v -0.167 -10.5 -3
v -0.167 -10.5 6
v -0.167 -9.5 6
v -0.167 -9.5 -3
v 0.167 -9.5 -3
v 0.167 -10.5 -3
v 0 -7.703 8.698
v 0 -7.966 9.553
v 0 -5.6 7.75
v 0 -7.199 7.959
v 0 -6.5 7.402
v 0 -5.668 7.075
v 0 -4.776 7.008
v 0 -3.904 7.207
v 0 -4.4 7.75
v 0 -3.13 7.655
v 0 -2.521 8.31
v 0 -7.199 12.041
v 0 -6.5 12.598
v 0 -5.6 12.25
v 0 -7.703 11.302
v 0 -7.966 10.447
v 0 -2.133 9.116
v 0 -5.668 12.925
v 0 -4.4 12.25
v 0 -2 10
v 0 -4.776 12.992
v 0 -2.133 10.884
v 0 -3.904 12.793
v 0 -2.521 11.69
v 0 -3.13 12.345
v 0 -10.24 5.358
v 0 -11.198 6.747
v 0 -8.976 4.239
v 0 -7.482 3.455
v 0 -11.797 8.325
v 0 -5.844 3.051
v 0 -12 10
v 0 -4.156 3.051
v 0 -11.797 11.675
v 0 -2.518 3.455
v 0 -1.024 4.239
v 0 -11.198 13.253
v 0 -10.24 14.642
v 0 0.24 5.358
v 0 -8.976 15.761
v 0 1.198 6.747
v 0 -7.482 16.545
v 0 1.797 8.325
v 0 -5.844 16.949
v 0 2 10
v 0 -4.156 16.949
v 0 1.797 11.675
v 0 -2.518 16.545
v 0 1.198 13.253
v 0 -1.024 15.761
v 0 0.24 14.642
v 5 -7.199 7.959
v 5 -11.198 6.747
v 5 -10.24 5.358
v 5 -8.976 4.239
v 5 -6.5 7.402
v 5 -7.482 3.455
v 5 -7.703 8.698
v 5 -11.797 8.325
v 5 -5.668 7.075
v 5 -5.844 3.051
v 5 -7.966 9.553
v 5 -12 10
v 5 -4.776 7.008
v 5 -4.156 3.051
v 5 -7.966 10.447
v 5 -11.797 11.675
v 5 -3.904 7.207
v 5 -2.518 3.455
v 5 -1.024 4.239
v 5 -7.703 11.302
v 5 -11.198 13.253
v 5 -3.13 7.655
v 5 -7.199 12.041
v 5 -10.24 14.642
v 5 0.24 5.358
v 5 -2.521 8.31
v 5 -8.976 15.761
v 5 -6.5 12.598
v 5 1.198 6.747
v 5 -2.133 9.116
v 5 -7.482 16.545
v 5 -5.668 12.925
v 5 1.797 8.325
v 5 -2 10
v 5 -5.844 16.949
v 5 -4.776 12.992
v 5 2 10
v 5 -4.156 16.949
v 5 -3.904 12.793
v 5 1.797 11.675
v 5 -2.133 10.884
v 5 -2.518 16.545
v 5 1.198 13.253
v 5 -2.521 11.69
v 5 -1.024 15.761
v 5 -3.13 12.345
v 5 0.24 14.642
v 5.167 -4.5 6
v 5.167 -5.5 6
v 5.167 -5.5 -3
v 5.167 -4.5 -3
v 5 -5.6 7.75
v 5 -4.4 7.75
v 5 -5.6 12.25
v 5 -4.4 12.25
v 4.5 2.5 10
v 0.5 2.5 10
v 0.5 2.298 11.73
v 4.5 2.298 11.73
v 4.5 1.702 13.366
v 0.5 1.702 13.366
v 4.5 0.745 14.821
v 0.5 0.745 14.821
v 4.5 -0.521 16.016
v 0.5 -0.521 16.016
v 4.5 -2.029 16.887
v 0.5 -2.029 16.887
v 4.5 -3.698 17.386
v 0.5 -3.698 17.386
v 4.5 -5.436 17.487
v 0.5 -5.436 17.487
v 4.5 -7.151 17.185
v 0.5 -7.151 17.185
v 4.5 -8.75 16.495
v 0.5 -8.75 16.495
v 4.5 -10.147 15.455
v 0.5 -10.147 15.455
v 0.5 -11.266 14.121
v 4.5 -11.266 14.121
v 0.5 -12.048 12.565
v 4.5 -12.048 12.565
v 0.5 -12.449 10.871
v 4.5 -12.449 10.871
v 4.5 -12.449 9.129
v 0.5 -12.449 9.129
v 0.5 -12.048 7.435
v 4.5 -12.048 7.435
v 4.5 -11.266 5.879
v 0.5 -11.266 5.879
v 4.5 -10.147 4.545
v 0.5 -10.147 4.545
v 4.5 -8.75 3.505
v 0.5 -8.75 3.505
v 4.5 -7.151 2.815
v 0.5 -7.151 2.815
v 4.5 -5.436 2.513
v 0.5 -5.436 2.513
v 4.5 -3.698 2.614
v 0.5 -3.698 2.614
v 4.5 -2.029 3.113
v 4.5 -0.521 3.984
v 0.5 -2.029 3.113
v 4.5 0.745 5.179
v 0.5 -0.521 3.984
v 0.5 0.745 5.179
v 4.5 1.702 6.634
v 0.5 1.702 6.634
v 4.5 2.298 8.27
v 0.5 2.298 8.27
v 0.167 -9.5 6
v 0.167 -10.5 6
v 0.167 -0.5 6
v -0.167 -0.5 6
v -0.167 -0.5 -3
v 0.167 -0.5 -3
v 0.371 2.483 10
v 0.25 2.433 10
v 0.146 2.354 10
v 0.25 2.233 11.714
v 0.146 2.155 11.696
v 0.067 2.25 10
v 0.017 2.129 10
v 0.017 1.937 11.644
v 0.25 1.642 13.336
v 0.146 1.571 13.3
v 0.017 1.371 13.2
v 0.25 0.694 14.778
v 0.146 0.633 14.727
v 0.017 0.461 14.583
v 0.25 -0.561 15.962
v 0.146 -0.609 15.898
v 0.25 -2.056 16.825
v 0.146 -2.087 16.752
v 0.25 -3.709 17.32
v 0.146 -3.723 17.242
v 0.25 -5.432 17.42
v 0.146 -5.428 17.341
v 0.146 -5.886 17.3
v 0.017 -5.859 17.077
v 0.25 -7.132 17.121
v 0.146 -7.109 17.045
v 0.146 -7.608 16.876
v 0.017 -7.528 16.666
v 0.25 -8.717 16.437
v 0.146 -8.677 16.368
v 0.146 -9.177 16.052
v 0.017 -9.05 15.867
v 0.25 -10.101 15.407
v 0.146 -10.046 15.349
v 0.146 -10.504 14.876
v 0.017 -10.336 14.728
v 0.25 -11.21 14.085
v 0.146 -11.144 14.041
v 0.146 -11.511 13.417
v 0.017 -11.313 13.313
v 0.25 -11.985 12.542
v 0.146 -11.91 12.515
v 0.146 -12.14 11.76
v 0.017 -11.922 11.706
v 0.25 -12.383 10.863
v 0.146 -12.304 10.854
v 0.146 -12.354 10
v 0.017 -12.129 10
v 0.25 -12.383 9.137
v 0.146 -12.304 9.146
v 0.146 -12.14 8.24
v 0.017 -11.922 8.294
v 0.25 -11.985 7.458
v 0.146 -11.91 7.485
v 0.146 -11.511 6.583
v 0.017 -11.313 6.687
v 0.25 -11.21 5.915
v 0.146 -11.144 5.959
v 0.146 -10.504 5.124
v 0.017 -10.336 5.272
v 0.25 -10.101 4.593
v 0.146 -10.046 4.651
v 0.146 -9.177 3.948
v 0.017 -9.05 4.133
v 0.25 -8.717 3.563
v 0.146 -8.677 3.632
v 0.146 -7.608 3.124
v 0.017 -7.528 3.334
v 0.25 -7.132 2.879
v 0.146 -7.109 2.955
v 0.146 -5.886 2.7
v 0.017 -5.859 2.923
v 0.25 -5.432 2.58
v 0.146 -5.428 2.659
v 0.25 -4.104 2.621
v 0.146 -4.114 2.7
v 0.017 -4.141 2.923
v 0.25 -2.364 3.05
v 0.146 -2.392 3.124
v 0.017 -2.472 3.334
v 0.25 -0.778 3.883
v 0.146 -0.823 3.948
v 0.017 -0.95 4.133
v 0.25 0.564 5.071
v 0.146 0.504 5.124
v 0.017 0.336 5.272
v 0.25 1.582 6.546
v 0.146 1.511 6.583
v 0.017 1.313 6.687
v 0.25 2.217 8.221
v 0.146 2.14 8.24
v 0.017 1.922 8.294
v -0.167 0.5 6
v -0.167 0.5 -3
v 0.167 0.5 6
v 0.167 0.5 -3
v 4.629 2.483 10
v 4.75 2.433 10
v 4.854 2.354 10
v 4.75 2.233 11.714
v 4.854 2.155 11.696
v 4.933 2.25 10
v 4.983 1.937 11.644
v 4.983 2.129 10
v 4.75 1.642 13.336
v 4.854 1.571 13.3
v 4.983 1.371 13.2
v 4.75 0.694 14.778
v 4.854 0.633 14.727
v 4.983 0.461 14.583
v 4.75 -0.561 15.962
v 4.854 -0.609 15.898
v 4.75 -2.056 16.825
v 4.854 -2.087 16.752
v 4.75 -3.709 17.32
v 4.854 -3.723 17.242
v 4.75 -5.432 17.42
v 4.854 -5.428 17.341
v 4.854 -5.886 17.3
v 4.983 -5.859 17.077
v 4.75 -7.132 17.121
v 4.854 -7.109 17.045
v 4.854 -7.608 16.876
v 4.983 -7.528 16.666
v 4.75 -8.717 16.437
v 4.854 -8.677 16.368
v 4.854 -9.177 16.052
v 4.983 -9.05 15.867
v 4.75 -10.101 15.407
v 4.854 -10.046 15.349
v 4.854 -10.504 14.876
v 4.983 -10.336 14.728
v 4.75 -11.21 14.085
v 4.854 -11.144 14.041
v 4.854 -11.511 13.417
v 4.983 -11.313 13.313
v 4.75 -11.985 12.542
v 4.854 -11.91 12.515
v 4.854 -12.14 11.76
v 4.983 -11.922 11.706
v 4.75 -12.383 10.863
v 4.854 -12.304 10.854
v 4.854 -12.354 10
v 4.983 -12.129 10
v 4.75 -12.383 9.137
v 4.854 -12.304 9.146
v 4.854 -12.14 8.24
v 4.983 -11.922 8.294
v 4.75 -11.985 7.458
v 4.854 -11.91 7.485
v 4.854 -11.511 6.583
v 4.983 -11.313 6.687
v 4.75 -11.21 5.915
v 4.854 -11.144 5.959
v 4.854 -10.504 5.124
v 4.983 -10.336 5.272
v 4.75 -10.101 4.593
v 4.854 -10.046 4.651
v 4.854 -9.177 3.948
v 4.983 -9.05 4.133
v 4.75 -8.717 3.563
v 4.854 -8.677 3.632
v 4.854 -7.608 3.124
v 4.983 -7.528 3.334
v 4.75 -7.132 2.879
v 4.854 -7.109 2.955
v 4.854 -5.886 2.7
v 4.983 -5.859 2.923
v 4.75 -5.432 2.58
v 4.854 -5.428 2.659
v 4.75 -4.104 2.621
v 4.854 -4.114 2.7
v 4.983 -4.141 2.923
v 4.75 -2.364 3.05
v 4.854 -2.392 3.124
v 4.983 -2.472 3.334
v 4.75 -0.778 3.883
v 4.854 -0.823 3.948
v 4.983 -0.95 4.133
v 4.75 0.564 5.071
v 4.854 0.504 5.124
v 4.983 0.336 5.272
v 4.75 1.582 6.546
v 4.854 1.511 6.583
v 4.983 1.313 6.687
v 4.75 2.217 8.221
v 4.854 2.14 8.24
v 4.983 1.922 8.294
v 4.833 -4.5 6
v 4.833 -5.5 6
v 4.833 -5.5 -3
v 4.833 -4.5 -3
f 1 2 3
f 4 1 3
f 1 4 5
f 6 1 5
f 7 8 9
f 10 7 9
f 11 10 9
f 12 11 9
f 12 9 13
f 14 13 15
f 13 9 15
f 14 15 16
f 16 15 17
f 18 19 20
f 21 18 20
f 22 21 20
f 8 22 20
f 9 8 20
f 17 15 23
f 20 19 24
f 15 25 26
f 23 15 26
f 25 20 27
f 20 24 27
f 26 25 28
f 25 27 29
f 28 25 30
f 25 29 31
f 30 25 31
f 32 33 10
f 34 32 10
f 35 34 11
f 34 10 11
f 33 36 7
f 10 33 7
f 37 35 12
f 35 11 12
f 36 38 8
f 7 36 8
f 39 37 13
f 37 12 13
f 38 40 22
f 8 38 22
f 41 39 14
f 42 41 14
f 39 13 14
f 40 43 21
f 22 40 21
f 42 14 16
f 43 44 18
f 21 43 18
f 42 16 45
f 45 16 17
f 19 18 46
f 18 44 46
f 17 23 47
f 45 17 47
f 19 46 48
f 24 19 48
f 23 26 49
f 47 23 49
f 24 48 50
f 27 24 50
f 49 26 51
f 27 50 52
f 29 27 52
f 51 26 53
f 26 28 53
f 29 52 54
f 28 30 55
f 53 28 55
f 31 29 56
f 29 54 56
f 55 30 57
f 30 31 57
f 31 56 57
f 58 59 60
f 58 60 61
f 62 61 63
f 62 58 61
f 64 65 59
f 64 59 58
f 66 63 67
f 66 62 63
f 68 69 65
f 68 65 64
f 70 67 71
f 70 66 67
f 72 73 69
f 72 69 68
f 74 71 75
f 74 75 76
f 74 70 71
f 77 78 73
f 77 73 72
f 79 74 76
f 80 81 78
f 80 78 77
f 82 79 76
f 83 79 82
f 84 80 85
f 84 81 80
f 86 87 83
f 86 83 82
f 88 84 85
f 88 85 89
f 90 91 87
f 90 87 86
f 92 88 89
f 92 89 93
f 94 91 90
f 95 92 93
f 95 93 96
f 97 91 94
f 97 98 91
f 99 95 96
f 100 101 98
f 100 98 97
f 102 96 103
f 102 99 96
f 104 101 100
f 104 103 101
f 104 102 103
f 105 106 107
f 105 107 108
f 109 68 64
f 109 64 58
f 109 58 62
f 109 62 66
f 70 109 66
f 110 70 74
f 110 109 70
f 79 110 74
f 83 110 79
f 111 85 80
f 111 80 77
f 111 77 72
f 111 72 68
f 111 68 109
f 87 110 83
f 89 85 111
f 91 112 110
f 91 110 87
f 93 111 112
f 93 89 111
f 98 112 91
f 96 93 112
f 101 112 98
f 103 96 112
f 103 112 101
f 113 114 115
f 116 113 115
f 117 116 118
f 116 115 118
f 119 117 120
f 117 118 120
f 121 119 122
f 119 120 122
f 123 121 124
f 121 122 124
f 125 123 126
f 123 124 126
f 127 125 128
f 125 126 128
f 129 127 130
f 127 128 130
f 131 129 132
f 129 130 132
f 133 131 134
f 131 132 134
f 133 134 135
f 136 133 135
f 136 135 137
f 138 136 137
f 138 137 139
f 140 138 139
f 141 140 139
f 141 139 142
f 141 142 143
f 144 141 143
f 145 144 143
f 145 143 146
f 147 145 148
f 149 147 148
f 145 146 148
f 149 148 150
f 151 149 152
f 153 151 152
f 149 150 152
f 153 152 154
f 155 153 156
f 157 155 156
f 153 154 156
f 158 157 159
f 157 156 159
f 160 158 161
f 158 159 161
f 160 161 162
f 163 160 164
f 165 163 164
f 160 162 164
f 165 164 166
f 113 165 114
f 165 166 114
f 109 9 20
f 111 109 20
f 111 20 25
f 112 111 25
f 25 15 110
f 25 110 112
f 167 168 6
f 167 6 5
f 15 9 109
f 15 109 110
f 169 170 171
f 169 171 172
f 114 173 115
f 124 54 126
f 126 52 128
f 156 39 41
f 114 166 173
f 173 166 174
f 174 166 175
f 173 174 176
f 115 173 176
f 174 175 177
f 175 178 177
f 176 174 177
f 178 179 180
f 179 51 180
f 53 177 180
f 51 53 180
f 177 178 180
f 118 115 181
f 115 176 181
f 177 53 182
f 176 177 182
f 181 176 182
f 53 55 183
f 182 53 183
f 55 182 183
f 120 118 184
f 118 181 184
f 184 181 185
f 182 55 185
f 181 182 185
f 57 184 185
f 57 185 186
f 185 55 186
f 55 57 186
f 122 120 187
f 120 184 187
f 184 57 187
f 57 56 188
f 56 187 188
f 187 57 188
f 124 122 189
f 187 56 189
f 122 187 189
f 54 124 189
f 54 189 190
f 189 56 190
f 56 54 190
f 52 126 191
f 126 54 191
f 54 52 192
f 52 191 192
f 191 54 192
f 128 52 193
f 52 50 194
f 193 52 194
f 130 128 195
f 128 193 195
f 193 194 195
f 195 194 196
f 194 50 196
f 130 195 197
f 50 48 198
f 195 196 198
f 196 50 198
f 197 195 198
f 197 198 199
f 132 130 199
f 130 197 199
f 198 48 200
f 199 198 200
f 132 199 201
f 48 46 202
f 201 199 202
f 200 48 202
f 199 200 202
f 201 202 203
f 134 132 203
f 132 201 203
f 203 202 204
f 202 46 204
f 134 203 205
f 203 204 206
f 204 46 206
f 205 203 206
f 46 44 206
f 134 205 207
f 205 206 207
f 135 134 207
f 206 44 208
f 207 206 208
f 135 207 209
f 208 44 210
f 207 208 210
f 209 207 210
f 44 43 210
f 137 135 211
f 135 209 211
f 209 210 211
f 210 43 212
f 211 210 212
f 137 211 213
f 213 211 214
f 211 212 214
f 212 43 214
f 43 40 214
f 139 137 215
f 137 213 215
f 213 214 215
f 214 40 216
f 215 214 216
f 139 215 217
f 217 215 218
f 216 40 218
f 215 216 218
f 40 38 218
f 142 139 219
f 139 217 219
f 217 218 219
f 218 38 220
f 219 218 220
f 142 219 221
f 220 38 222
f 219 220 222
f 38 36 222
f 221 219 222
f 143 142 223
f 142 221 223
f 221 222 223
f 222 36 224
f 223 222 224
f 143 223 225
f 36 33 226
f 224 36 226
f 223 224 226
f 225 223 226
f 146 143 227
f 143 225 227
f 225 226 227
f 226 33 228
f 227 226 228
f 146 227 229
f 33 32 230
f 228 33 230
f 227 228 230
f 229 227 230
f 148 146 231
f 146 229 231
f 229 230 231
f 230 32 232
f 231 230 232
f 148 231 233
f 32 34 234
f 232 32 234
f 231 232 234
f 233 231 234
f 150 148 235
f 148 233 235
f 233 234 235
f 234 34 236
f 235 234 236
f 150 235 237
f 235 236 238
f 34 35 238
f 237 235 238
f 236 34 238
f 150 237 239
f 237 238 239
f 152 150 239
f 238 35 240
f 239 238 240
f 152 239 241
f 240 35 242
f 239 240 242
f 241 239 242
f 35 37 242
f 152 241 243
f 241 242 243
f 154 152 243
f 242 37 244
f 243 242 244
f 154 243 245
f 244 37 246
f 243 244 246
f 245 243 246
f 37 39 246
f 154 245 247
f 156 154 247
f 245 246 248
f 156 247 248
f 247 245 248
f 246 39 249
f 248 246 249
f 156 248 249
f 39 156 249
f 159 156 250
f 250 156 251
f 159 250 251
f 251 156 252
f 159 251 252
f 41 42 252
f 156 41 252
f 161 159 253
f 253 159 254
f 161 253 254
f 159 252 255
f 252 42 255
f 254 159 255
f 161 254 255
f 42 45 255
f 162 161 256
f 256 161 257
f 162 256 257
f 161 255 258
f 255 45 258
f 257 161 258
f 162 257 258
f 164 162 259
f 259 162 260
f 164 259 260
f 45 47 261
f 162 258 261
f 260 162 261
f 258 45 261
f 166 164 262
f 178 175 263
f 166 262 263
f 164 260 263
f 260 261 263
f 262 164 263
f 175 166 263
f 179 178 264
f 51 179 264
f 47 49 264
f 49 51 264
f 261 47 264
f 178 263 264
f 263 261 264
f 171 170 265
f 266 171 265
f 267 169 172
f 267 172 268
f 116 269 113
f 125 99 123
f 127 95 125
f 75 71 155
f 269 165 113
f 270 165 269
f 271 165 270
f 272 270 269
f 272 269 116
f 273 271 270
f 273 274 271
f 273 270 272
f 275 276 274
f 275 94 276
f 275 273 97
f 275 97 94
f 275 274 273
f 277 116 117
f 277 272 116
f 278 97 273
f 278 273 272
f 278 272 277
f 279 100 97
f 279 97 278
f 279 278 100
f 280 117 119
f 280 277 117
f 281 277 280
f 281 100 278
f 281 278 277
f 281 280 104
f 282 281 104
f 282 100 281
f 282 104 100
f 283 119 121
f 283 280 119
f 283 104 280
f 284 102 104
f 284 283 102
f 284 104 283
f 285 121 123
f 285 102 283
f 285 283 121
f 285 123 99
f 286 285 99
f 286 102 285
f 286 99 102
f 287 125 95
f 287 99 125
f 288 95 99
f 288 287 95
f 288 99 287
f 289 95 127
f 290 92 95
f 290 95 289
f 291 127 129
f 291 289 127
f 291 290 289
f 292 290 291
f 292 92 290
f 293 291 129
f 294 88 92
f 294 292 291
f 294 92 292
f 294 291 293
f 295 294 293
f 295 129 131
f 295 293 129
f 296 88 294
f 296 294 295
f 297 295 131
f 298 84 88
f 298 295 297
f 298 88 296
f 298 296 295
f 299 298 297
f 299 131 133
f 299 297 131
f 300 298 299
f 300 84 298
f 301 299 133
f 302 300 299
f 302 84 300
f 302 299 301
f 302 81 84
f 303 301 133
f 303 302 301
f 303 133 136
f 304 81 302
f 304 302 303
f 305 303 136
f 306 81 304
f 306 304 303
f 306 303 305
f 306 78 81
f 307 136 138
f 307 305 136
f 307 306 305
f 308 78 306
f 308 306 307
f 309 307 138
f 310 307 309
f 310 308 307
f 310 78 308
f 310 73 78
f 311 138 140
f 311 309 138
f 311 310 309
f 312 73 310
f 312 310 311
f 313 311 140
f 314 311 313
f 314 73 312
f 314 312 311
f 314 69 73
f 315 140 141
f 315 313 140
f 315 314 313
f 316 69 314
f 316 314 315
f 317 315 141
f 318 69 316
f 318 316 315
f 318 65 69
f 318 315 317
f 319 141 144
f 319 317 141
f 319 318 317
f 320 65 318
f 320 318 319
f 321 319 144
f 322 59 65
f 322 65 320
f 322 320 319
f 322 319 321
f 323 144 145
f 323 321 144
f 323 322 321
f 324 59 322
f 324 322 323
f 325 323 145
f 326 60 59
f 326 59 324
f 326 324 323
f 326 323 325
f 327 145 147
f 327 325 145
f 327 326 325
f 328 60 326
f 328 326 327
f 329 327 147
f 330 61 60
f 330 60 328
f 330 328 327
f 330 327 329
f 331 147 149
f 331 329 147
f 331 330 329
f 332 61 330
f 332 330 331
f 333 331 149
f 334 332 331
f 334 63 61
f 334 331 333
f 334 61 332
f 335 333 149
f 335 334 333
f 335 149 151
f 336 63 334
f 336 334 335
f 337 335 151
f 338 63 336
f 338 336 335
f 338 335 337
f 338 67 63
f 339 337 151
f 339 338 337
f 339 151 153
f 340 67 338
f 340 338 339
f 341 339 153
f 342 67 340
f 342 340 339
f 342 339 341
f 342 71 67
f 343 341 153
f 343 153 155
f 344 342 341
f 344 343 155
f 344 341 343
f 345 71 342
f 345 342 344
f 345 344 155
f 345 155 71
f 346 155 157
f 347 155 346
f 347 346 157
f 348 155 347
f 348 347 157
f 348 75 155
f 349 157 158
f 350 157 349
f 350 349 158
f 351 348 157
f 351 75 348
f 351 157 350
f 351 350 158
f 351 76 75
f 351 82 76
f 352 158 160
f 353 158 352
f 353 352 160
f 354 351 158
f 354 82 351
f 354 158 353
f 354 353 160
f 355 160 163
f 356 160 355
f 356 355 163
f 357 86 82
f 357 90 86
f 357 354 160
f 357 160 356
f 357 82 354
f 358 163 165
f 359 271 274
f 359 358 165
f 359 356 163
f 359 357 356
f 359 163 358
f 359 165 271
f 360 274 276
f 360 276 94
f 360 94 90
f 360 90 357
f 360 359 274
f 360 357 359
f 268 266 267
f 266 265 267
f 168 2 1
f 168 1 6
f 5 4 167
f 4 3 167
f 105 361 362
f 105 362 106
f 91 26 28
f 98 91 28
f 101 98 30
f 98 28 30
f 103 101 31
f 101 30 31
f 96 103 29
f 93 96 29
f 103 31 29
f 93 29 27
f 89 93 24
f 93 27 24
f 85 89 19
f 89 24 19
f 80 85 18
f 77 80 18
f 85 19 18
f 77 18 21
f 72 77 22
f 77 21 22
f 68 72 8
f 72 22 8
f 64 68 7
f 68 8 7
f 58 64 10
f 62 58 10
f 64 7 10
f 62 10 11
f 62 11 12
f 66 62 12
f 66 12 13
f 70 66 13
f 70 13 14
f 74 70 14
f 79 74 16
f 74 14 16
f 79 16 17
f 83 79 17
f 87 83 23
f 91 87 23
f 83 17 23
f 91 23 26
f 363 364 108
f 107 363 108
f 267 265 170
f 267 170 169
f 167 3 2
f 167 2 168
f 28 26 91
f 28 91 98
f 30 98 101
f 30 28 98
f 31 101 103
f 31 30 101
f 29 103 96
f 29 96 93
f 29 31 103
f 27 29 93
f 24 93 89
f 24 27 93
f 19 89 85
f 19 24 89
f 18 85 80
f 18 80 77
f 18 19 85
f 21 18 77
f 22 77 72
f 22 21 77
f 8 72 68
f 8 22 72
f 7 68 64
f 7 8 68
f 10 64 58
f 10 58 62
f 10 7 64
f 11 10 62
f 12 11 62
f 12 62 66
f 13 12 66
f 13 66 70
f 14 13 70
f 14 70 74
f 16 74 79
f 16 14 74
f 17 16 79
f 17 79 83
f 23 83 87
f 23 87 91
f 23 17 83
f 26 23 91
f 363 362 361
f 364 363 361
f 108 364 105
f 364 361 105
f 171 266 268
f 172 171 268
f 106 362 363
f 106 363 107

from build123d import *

# Parameters (mm, degrees)
SKETCH001_R       = 3
SKETCH001_W       = 1.2
SKETCH001_H       = 4.5
PAD001_DEPTH      = 5
SKETCH_R          = 7.5
SKETCH_R_2        = 3
PAD_DEPTH         = 5
FILLET_R          = 0.5
SKETCH003_W       = 0.333334
SKETCH003_H       = 1
PAD002_DEPTH      = 6
PAD002_DEPTH_BACK = 3


with BuildPart() as pad001:
    # Sketch001 → Pad001 (new body)
    with BuildSketch(Plane.YZ):
        with Locations((-5, 10)):
            Circle(SKETCH001_R)
        with Locations((-5, 10)):
            Rectangle(SKETCH001_W, SKETCH001_H, mode=Mode.SUBTRACT)
    extrude(amount=PAD001_DEPTH)


with BuildPart() as fillet_body:
    # Sketch → Pad (new body)
    with BuildSketch(Plane.YZ):
        with Locations((-5, 10)):
            Circle(SKETCH_R)
        with Locations((-5, 10)):
            Circle(SKETCH_R_2, mode=Mode.SUBTRACT)
    extrude(amount=PAD_DEPTH)

    # Fillet
    fillet_edges = [fillet_body.edges().sort_by_distance(p)[0] for p in [
        (0, -12.5, 10),
        (5, -12.5, 10),
    ]]
    fillet(fillet_edges, radius=FILLET_R)


with BuildPart() as pad002:
    # Sketch003 → Pad002 (new body, two sides)
    with BuildSketch(Plane.XY) as pad002_sk:
        Rectangle(SKETCH003_W, SKETCH003_H)
        with Locations((5, -5)):
            Rectangle(SKETCH003_W, SKETCH003_H)
        with Locations((0, -10)):
            Rectangle(SKETCH003_W, SKETCH003_H)
    extrude(amount=PAD002_DEPTH)
    extrude(pad002_sk.sketch, amount=-PAD002_DEPTH_BACK)


solid = Compound([pad001.part, fillet_body.part, pad002.part])
